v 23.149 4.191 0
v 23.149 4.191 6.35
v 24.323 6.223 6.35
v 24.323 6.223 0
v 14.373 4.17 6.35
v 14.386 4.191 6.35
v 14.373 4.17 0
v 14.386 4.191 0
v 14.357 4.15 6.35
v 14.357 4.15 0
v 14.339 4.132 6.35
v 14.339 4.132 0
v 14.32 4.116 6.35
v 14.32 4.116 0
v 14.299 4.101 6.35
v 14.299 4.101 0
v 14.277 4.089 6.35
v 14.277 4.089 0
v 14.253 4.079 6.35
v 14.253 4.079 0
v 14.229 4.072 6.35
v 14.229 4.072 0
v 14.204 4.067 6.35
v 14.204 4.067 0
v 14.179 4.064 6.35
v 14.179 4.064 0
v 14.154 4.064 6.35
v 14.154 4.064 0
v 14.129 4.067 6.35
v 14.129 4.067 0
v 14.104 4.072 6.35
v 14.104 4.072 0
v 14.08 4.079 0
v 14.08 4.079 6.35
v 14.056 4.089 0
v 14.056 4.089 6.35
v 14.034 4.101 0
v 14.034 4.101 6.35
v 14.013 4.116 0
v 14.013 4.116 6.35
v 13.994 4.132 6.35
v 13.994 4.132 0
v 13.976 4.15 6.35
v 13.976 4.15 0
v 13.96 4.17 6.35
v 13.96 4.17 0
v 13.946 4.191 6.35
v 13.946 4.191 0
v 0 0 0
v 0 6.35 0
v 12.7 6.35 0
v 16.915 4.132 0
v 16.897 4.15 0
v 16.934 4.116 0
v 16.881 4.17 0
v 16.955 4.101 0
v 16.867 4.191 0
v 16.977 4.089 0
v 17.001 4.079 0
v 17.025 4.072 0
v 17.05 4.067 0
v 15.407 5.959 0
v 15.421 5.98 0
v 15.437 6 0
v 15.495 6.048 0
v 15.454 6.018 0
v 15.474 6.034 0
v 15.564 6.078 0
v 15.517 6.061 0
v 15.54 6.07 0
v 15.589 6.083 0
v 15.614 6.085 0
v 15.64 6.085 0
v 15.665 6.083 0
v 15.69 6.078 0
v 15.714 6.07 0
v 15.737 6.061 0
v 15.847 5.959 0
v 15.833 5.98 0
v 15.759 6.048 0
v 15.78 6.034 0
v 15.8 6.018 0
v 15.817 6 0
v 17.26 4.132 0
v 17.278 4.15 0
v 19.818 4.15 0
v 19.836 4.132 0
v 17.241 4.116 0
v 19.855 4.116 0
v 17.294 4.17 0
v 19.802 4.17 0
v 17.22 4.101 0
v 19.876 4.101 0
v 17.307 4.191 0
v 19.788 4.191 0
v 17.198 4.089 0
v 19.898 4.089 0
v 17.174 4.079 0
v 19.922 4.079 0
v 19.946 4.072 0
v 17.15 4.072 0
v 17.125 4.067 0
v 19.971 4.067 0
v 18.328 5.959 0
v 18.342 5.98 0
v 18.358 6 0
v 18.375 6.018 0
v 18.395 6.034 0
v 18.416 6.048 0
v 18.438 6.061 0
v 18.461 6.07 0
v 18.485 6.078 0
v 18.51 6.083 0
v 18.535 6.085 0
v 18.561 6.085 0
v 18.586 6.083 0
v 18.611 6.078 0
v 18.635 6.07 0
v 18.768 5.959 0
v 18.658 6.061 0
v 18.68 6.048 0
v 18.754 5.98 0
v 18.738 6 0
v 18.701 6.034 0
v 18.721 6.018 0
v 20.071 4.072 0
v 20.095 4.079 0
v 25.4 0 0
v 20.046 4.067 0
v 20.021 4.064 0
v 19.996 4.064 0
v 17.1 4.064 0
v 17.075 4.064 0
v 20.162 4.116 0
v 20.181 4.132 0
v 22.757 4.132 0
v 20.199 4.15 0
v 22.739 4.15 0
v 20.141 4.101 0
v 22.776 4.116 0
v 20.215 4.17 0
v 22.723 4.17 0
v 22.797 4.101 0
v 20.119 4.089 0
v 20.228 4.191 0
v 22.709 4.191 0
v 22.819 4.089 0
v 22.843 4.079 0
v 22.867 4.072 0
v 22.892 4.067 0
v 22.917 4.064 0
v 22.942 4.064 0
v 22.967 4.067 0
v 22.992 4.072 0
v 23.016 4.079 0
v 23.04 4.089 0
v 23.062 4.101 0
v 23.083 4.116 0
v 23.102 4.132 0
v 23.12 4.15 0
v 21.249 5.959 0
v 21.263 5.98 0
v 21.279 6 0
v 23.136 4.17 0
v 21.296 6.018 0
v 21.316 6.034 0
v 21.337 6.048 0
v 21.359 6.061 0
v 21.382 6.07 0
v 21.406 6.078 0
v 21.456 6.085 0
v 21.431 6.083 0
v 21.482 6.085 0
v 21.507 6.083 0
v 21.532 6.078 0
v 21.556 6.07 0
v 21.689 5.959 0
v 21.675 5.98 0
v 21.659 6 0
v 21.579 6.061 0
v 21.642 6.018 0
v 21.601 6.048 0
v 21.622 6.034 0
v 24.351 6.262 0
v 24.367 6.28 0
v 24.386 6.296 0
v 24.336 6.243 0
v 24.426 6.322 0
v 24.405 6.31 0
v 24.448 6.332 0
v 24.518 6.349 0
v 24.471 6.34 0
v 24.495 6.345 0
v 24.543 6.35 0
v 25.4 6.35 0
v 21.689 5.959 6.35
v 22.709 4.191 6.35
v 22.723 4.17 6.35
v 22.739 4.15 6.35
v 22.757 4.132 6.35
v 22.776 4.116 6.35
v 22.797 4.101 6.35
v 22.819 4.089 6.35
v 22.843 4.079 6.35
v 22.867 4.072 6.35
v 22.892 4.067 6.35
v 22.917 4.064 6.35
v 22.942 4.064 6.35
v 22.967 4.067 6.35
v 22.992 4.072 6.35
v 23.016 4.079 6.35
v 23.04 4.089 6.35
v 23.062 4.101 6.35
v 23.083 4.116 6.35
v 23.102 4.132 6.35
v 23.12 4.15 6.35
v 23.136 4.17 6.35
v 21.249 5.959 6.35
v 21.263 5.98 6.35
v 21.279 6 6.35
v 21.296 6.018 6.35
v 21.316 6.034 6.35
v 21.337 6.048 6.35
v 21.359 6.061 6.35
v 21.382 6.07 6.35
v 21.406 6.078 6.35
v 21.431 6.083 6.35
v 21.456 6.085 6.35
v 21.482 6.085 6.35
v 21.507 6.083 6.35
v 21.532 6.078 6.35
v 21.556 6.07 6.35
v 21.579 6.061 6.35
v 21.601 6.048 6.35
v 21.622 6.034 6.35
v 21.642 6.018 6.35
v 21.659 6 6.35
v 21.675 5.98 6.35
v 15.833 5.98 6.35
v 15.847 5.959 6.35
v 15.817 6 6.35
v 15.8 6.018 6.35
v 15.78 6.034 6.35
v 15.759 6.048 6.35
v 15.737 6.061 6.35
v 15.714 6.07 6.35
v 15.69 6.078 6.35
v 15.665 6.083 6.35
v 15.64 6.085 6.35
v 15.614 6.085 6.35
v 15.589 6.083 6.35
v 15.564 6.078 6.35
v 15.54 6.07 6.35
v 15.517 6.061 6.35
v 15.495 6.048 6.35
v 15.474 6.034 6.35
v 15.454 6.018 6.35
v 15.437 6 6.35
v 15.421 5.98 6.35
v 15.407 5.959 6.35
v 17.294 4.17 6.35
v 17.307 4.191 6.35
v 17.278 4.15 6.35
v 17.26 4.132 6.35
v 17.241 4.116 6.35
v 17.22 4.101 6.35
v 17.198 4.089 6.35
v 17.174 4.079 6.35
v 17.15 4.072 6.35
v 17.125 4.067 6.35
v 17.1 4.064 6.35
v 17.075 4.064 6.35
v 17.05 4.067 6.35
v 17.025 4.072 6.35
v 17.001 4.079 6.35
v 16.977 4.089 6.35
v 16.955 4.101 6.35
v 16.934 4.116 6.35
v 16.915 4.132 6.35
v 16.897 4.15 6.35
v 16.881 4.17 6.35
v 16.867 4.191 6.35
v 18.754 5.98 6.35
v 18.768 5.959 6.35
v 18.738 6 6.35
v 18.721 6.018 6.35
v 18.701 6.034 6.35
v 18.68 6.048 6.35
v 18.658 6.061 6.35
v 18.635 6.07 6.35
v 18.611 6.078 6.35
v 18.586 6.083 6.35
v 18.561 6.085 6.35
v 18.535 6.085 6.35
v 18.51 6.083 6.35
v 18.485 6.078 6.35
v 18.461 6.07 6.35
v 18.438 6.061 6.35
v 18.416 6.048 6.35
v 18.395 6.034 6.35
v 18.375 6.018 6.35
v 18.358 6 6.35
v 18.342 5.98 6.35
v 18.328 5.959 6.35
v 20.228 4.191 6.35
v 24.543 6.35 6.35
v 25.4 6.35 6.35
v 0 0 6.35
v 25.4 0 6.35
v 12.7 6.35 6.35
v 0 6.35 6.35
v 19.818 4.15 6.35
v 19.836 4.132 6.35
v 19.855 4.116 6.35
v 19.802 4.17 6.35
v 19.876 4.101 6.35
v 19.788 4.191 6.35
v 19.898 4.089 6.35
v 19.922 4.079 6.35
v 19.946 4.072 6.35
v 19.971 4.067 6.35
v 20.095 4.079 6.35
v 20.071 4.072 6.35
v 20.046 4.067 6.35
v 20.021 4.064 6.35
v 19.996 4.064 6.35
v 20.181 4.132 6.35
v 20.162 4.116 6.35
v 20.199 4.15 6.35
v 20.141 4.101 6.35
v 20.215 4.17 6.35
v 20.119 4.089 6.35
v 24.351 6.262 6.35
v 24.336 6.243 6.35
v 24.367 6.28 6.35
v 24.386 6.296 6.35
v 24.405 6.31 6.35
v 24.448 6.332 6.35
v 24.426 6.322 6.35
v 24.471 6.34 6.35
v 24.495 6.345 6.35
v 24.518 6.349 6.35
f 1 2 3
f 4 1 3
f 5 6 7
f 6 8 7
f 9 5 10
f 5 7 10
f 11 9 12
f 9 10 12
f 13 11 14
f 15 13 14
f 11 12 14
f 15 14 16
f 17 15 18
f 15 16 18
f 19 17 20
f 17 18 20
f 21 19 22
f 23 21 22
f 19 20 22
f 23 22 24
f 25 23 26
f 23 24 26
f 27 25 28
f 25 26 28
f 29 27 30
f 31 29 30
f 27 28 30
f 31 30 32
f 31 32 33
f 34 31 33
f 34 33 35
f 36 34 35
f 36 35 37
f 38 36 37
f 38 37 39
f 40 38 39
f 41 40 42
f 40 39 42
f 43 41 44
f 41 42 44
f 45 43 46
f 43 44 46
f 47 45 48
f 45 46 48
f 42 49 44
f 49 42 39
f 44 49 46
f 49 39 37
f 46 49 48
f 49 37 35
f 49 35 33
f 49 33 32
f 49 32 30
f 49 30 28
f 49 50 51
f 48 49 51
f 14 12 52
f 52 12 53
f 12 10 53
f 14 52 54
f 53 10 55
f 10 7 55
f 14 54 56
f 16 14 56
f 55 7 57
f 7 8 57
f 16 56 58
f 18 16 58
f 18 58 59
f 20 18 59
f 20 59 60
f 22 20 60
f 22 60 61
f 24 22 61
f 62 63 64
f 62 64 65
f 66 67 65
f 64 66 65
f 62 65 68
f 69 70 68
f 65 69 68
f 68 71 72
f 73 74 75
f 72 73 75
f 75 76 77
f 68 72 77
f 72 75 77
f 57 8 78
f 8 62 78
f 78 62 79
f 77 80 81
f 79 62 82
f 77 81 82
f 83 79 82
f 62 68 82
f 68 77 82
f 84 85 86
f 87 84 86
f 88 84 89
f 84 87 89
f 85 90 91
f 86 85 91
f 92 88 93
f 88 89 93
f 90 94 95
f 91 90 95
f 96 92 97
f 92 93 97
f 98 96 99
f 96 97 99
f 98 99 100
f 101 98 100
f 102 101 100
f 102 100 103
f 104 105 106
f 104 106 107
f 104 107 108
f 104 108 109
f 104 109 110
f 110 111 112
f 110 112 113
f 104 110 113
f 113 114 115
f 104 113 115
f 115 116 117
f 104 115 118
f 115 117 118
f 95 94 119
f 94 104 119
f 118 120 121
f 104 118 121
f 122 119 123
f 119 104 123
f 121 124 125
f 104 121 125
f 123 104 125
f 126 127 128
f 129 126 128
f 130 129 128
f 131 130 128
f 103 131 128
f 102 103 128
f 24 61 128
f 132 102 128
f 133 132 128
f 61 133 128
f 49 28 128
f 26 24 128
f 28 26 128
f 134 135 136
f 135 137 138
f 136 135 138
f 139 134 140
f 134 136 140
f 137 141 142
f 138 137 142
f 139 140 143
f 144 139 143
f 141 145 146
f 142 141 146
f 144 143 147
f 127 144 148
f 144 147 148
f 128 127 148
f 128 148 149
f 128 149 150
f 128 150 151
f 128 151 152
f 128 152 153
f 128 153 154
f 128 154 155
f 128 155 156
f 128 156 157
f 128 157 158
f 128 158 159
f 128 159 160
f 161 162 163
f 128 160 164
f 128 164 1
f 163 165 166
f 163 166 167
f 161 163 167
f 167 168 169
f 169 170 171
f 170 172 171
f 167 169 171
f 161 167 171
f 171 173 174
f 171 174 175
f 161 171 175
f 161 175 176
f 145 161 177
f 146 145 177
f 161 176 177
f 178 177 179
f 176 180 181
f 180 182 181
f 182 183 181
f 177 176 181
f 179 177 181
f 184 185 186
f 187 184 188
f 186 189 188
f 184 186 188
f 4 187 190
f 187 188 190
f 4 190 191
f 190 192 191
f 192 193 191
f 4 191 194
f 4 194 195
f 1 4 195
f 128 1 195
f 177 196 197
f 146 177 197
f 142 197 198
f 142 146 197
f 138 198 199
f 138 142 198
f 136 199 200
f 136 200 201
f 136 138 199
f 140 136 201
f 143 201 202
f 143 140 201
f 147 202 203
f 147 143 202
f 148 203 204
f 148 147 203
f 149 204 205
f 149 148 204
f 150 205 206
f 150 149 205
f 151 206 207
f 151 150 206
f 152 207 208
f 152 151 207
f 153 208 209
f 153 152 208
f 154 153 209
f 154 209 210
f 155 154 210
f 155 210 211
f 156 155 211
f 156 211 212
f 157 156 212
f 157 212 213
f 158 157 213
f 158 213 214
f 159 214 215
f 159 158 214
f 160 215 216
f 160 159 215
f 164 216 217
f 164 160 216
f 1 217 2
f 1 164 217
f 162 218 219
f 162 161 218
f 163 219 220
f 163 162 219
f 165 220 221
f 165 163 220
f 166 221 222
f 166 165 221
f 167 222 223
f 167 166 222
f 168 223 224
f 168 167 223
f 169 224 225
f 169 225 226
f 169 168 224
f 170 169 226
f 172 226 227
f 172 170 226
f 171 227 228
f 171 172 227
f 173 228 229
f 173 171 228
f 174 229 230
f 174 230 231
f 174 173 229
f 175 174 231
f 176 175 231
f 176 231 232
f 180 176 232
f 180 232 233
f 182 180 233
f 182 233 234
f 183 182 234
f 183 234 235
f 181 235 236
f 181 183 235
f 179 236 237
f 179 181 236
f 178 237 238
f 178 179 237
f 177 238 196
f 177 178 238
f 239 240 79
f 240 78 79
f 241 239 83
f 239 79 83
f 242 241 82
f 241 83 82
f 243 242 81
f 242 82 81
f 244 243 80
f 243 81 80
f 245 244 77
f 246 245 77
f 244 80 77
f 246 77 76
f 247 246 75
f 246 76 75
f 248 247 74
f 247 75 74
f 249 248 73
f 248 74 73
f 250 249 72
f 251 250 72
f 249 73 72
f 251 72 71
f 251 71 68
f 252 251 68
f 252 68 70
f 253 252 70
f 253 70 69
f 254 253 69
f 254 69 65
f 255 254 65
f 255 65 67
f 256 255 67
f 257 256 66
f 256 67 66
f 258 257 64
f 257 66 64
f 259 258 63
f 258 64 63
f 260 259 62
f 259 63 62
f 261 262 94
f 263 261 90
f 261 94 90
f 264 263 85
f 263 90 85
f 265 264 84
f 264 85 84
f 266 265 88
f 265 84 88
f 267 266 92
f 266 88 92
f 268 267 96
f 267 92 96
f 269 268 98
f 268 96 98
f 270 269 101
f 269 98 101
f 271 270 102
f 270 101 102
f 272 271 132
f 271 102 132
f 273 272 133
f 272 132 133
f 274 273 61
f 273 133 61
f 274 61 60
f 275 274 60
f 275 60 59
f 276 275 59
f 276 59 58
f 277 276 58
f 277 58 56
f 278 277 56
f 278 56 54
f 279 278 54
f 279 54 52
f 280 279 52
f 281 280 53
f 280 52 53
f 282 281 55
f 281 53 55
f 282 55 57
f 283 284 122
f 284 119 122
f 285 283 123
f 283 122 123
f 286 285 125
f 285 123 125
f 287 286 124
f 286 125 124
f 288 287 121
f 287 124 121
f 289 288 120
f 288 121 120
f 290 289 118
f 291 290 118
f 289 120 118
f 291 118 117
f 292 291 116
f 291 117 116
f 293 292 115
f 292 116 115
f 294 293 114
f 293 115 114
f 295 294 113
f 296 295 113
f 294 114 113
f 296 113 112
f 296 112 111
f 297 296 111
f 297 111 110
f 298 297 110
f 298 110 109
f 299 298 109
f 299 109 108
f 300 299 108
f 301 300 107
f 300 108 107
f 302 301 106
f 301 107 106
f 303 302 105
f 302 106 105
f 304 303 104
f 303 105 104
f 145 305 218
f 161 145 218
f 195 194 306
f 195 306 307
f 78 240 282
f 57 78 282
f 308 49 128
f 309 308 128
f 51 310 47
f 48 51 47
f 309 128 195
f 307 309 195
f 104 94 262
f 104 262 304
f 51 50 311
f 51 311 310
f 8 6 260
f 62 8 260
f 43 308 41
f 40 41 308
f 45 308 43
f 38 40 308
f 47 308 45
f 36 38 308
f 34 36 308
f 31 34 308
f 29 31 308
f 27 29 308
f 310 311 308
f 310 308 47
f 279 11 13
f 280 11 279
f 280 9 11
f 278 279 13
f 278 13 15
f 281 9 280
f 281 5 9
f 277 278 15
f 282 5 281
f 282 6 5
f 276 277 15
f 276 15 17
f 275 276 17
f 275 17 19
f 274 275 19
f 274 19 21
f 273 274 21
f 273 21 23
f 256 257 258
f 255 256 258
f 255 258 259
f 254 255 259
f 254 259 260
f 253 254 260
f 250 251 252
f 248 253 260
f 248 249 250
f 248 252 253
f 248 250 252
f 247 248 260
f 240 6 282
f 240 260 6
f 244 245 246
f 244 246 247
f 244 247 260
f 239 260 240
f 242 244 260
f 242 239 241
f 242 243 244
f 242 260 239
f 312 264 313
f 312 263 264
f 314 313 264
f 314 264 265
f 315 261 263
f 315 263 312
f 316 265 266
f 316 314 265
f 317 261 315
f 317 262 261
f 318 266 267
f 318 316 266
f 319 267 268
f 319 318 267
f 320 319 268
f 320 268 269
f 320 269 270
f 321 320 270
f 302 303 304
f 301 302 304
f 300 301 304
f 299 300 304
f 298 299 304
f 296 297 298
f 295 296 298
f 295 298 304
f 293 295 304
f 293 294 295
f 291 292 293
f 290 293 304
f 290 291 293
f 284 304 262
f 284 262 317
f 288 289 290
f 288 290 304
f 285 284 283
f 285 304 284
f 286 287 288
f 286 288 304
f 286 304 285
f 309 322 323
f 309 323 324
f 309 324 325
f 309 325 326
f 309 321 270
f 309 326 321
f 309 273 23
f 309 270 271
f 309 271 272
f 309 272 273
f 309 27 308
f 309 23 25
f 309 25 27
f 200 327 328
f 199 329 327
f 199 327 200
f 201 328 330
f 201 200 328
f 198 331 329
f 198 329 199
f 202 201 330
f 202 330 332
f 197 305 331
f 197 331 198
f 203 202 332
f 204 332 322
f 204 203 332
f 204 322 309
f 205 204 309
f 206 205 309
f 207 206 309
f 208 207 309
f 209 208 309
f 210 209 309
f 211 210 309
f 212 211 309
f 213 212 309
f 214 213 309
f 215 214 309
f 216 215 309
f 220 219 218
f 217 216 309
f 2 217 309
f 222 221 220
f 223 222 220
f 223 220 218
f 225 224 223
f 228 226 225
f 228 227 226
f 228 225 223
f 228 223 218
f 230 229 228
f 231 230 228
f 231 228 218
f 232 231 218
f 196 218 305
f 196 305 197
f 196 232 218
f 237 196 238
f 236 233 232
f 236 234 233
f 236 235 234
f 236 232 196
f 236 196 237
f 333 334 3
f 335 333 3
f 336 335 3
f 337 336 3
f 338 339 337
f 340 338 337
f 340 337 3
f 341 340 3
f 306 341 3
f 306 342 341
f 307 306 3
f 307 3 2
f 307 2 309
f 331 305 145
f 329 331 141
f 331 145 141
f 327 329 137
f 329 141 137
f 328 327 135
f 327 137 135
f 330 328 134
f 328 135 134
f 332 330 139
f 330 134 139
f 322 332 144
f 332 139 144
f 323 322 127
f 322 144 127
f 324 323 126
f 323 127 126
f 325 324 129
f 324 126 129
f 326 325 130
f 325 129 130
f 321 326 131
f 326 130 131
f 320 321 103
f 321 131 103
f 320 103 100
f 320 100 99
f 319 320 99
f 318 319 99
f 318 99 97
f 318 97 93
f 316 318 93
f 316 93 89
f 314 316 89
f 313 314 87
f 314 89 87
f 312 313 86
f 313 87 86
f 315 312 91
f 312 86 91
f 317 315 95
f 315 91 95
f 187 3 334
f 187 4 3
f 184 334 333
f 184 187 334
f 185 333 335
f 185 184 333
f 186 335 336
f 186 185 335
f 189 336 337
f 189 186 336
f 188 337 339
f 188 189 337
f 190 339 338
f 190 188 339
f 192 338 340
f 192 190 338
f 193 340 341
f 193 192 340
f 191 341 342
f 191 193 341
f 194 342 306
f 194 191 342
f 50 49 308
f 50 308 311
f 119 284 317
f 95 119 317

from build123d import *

# Parameters (mm, degrees)
F0_W     = 25.4
F0_H     = 6.35
F1_DEPTH = 6.35
F3_DEPTH = 25.4
F4_R     = 0.254
F5_R     = 0.254


with BuildPart() as f1:
    # F0 (on Top) → F1 (new body)
    with BuildSketch(Plane.XY):
        with Locations((12.7, 3.175)):
            Rectangle(F0_W, F0_H)
    extrude(amount=F1_DEPTH)

    # F2 (on face) → F3 (cut)
    with BuildSketch(Plane.XY.offset(6.35)):
        Polygon((15.621, 6.35), (12.7, 6.35), (14.1664696837, 3.81), (15.6269696837, 6.3396602045), align=None)
        Polygon((15.6329393675, 6.35), (15.621, 6.35), (15.6269696837, 6.3396602045), align=None)
        Polygon((15.6329393675, 6.35), (15.6269696837, 6.3396602045), (17.0874696837, 3.81), (18.5479696837, 6.3396602045), (18.542, 6.35), align=None)
        Polygon((18.5539393675, 6.35), (18.542, 6.35), (18.5479696837, 6.3396602045), align=None)
        Polygon((18.5539393675, 6.35), (18.5479696837, 6.3396602045), (20.0084696837, 3.81), (21.4689696837, 6.3396602045), (21.463, 6.35), align=None)
        Polygon((21.4749393675, 6.35), (21.463, 6.35), (21.4689696837, 6.3396602045), align=None)
        Polygon((21.4749393675, 6.35), (21.4689696837, 6.3396602045), (22.9294696837, 3.81), (24.3959393675, 6.35), align=None)
    extrude(amount=-F3_DEPTH, mode=Mode.SUBTRACT)

    # F4
    f4_edges = [f1.edges().sort_by_distance(p)[0] for p in [
        (21.46897, 6.33966, 3.175),
    ]]
    fillet(f4_edges, radius=F4_R)

    # F5
    f5_edges = [f1.edges().sort_by_distance(p)[0] for p in [
        (24.395939, 6.35, 3.175),
        (22.92947, 3.81, 3.175),
        (20.00847, 3.81, 3.175),
        (18.54797, 6.33966, 3.175),
        (17.08747, 3.81, 3.175),
        (15.62697, 6.33966, 3.175),
        (14.16647, 3.81, 3.175),
    ]]
    fillet(f5_edges, radius=F5_R)


solid = f1.part
